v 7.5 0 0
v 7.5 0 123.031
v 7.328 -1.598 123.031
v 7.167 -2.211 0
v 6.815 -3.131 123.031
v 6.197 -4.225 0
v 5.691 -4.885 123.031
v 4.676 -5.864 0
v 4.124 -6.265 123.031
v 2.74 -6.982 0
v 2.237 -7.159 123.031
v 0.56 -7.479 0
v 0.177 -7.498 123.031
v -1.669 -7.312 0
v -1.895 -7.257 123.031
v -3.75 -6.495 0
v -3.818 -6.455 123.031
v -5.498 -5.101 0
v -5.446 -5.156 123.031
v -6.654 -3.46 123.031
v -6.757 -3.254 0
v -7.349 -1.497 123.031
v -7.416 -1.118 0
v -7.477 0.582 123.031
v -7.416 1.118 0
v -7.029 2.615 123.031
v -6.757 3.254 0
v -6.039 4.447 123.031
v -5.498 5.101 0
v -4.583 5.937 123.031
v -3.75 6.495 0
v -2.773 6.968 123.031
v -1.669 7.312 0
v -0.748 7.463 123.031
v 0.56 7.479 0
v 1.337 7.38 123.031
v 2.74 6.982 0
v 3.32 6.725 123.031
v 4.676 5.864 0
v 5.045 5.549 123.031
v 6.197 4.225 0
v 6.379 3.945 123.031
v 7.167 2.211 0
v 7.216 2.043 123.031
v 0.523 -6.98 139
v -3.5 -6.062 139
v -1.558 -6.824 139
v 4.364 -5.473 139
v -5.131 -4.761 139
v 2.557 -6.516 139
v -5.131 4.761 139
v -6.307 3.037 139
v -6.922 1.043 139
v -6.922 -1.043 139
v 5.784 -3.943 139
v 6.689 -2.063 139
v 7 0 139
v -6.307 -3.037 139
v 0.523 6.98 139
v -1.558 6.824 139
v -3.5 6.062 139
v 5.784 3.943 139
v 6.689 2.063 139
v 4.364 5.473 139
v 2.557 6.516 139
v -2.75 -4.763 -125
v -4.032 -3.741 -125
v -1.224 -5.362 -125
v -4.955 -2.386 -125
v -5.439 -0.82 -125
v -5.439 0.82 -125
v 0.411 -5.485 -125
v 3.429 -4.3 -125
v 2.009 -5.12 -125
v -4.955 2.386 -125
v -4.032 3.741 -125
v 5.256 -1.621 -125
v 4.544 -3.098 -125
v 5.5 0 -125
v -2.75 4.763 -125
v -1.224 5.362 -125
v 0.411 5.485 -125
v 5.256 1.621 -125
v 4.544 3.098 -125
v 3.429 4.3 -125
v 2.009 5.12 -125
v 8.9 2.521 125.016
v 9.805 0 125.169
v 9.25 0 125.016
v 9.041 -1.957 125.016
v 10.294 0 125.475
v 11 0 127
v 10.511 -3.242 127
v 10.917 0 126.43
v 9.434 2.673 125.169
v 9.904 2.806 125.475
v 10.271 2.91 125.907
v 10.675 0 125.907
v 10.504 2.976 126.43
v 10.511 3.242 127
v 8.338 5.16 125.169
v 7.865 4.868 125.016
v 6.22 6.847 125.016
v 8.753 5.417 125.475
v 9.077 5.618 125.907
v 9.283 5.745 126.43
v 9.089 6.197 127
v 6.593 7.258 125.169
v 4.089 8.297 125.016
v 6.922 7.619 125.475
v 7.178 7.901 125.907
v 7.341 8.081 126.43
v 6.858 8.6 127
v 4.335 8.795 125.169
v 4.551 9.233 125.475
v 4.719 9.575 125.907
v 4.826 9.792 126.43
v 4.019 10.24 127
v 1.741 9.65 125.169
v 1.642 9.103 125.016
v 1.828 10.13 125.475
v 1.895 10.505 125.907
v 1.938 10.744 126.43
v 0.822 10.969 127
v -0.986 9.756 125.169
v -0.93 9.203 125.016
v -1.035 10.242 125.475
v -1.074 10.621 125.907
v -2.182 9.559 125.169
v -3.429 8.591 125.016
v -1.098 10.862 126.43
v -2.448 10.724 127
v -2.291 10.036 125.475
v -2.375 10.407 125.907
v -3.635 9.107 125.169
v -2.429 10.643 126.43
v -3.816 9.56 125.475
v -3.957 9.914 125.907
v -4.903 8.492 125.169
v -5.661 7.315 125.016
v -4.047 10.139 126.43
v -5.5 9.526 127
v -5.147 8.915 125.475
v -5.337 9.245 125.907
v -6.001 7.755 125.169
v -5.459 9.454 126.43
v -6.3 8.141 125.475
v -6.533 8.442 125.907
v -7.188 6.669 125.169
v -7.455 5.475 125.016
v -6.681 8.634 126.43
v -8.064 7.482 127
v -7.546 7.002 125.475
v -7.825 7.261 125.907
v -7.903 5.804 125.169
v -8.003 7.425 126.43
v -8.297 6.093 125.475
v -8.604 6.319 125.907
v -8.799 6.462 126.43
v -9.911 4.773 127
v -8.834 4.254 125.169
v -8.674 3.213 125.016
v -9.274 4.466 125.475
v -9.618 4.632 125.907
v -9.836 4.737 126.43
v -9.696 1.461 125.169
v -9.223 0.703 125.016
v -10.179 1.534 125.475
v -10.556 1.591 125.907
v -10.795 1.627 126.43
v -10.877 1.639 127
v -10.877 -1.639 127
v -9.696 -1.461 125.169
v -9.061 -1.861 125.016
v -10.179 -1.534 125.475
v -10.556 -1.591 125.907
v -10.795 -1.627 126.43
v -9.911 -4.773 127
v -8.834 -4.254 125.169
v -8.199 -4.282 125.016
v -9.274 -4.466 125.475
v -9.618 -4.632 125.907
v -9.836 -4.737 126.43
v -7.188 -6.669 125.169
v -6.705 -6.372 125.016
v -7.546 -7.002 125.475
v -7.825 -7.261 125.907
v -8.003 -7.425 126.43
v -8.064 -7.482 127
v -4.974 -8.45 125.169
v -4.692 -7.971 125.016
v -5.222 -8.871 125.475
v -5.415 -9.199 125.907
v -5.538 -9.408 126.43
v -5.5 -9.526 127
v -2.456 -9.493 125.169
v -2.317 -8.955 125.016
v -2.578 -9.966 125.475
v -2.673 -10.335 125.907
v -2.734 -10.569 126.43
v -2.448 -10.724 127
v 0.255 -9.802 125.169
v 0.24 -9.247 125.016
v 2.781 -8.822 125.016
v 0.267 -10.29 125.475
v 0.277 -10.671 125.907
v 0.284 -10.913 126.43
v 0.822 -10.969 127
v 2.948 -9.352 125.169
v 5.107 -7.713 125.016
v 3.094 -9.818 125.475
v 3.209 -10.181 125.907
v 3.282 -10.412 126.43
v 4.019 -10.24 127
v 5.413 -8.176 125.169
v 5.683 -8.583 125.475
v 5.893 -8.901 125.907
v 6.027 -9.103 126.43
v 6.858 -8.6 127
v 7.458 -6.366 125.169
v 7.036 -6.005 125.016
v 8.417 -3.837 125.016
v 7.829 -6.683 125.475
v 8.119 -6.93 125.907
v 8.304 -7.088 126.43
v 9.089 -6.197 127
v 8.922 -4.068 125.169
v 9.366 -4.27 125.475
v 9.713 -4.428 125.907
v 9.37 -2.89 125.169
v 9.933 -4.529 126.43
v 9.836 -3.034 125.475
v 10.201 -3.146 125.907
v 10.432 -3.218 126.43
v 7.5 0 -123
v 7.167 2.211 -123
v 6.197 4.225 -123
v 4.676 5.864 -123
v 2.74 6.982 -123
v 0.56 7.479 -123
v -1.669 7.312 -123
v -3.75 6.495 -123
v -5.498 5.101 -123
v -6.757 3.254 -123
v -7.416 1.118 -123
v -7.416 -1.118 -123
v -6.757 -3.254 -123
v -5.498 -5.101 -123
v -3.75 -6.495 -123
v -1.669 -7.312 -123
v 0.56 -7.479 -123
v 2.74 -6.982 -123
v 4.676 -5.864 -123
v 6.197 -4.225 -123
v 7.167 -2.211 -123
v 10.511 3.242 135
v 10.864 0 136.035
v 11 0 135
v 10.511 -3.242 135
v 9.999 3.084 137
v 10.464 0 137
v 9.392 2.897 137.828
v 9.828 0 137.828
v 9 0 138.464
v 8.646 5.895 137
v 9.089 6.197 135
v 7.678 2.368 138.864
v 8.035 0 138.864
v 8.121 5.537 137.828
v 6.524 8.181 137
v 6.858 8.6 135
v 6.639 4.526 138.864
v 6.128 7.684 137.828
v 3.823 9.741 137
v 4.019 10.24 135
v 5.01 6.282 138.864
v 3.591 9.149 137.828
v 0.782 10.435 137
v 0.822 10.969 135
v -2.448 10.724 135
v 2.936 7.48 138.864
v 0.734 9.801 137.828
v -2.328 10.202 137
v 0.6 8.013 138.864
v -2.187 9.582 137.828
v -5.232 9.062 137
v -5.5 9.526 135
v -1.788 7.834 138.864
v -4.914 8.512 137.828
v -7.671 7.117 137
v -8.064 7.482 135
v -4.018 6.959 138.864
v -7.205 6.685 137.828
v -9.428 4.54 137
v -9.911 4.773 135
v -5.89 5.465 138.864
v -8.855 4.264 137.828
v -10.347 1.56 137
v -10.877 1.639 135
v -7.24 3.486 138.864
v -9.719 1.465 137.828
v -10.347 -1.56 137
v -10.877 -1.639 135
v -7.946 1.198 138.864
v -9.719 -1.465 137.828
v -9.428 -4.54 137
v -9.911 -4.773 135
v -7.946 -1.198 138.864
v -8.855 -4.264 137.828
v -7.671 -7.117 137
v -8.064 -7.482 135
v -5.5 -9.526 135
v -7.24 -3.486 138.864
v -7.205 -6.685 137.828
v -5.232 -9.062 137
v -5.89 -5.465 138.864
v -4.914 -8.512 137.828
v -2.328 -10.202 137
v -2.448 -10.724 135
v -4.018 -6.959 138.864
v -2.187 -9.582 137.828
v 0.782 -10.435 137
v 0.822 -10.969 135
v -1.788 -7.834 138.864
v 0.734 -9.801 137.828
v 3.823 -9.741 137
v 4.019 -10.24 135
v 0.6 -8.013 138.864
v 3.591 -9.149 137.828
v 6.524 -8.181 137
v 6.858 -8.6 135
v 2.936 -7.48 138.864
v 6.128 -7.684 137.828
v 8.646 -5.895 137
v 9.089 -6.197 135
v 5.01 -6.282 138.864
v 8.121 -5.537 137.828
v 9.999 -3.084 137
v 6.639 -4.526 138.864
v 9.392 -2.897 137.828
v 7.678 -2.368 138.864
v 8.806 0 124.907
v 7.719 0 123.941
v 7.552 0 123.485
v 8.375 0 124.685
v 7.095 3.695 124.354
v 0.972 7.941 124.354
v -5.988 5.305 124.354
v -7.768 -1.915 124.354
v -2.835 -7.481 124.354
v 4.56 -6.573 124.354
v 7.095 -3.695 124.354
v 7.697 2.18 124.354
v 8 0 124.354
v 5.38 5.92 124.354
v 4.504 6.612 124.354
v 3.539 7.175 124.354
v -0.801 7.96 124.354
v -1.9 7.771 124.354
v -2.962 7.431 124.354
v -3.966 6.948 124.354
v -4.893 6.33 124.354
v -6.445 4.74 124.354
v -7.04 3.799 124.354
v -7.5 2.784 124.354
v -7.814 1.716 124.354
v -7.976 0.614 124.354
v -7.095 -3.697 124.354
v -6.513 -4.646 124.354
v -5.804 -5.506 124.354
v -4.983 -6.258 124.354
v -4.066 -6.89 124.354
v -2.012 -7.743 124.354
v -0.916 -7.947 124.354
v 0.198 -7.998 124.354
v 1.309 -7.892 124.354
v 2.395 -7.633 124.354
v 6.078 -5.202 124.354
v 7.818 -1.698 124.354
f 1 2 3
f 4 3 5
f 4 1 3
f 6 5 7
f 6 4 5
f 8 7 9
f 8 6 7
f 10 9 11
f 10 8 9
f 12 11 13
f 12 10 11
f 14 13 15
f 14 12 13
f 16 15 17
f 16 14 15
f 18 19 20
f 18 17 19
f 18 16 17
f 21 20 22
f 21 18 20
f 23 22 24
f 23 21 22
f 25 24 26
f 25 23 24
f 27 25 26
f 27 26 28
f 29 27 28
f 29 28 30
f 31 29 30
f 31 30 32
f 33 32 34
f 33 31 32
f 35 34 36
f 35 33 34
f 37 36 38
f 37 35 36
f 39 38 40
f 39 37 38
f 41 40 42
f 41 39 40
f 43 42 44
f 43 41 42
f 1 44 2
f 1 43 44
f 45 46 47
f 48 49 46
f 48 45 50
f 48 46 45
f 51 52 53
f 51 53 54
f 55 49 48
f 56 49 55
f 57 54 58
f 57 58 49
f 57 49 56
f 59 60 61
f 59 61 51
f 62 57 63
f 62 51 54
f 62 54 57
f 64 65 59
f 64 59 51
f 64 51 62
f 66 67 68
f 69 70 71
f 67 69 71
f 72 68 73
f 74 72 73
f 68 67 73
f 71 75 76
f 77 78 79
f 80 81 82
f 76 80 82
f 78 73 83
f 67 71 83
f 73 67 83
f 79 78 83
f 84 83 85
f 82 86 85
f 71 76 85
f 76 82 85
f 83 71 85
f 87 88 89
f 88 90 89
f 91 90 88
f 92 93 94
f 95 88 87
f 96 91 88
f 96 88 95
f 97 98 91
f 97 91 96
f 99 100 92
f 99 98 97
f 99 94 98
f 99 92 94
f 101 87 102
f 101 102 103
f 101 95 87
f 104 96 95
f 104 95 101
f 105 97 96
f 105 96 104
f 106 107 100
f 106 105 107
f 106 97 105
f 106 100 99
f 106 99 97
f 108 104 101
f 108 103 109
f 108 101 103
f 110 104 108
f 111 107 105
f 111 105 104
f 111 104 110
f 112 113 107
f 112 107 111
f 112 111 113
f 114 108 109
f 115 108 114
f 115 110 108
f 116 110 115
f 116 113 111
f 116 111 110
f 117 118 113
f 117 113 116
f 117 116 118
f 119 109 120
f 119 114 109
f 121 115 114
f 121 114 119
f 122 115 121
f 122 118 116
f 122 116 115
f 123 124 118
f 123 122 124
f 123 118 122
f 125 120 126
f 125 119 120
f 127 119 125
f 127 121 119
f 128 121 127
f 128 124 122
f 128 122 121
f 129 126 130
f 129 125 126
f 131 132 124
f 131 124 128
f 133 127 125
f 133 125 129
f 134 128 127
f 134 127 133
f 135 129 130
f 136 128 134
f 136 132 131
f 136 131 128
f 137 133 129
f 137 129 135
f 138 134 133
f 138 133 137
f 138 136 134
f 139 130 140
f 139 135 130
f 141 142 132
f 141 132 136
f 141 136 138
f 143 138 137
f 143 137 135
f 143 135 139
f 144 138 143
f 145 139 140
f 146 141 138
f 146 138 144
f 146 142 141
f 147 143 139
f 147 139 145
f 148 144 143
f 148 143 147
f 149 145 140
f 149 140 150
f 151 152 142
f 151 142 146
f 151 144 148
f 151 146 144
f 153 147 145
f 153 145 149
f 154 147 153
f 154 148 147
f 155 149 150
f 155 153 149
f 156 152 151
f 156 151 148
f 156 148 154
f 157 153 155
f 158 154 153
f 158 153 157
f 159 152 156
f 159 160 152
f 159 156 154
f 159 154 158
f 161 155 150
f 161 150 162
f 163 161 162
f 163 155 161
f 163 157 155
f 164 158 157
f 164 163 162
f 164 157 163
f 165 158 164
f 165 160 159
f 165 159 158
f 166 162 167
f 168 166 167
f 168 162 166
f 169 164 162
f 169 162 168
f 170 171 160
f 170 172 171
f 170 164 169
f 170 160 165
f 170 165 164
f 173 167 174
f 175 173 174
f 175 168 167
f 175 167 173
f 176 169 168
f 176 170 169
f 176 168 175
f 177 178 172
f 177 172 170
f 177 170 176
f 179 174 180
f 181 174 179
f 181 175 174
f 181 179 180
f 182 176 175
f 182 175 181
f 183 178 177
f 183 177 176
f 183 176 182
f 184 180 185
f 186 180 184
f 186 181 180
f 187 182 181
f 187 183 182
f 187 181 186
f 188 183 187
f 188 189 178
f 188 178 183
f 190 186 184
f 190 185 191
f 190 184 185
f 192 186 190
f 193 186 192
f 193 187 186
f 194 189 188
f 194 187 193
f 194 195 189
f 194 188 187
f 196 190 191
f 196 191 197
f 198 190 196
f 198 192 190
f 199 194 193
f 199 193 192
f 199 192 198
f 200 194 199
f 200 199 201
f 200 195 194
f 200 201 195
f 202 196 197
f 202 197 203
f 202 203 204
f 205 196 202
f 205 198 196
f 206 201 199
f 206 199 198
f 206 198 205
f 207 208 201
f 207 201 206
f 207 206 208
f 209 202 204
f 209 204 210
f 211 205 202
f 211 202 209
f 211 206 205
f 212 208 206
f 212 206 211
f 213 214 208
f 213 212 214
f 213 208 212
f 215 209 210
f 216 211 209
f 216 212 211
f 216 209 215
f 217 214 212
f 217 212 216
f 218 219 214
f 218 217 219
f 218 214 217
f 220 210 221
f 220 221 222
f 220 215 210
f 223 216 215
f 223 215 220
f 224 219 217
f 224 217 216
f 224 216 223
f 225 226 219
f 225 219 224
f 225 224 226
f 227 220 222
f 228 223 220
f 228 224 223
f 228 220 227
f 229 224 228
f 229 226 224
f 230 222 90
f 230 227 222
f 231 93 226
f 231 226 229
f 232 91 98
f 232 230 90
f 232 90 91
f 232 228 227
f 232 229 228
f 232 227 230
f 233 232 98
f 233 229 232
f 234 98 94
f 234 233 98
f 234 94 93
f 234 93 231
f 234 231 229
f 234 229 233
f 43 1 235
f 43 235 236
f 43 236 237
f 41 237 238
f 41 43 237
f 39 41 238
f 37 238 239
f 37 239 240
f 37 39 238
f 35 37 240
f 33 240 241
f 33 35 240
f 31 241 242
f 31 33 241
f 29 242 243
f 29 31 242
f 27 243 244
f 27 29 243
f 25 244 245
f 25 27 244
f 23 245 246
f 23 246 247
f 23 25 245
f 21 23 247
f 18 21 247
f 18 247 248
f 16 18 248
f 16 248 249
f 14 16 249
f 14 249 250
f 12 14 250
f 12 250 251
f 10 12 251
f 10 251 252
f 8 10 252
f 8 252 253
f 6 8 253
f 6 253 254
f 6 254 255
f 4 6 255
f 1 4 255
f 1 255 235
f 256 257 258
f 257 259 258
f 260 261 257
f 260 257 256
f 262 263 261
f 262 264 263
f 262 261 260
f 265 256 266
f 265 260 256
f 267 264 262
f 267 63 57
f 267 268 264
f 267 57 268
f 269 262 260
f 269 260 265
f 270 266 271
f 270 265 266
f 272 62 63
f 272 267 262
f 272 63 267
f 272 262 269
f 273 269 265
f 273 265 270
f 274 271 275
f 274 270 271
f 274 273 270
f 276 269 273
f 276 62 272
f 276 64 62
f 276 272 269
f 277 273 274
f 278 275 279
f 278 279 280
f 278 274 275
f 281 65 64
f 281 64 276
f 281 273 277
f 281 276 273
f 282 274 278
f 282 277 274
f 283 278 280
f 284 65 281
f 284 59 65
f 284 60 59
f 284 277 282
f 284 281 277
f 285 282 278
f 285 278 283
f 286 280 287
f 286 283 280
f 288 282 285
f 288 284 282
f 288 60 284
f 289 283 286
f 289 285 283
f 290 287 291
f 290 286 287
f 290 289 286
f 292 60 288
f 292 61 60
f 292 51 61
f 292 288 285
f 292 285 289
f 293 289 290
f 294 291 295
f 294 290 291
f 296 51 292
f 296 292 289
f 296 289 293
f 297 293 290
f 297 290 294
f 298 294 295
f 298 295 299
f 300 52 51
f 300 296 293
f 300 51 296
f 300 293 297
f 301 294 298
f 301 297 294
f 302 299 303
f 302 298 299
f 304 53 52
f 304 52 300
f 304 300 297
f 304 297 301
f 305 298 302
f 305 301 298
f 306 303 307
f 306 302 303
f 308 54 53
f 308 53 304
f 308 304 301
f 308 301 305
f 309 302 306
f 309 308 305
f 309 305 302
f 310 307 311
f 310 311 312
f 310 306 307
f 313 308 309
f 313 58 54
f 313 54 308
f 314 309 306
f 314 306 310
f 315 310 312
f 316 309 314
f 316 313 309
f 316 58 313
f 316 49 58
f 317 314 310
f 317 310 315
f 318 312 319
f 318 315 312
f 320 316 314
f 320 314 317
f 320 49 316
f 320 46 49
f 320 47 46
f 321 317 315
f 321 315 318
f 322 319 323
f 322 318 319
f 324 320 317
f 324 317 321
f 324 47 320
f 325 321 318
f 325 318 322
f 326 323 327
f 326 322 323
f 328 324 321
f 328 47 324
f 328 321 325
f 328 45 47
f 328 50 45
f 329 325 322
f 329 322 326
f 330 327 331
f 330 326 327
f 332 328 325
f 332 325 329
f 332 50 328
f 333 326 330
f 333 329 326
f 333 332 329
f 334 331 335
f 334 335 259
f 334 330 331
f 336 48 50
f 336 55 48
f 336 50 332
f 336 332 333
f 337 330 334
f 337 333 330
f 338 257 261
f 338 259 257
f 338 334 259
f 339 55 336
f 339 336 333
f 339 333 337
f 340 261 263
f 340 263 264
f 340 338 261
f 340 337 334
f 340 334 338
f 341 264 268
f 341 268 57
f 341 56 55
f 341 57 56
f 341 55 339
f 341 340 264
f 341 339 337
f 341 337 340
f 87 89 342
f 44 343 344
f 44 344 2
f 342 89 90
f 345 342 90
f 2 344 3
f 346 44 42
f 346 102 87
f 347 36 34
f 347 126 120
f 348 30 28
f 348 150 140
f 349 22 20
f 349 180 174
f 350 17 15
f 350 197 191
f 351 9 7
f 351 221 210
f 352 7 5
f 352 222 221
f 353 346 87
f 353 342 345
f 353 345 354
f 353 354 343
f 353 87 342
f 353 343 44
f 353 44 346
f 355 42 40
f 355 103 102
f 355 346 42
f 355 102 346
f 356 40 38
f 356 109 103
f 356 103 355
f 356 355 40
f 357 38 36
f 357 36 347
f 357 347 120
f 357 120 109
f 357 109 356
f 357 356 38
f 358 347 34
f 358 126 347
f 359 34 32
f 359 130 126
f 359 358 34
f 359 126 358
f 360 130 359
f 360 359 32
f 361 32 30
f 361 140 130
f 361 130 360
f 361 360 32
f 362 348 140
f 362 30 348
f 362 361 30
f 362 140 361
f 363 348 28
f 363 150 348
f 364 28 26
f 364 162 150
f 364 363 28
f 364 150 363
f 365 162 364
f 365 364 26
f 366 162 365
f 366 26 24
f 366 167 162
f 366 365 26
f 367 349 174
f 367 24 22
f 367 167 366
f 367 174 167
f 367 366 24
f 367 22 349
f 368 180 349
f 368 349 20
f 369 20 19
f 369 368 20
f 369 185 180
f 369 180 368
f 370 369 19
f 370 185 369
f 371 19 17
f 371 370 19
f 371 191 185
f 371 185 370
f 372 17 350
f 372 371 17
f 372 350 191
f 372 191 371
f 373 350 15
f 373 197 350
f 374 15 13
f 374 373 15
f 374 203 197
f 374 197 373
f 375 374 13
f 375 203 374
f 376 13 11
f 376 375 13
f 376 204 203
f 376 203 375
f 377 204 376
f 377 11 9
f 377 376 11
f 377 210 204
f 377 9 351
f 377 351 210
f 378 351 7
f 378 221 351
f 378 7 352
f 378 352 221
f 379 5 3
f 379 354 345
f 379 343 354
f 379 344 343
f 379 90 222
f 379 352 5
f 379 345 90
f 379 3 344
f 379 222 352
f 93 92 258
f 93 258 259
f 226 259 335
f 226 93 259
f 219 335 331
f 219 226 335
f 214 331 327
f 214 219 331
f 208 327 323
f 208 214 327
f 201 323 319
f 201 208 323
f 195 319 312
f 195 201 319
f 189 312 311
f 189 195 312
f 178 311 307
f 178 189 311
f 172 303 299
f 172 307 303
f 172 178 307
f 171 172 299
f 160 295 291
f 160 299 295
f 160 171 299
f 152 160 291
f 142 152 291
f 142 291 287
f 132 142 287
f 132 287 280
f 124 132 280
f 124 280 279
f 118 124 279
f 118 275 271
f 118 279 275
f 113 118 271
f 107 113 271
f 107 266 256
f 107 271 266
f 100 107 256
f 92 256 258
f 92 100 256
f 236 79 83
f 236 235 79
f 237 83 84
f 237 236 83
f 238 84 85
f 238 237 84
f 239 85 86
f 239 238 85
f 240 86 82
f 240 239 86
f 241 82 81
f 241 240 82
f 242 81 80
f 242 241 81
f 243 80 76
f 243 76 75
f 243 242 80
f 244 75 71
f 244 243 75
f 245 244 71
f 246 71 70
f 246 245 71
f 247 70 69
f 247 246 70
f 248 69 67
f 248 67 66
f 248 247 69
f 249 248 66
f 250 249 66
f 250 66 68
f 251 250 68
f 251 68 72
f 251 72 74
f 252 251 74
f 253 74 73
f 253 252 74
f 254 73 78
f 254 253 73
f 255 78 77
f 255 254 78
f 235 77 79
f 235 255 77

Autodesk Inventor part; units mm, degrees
ref_plane "YZ Plane" through (0, 0, 0) normal (1, 0, 0) x (0, 1, 0)
ref_plane "XZ Plane" through (0, 0, 0) normal (0, 1, 0) x (-1, 0, 0)
ref_plane "XY Plane" through (0, 0, 0) normal (0, 0, 1) x (1, 0, 0)
sketch "Sketch1" plane through (0, 0, 0) normal (0, 0, 1) x (1, 0, 0)
  circle A0 centre (0, 0) radius 7.5
  dimension "d0" = 15
extrude "Extrusion1" add sketch "Sketch1" along normal mid plane 250
sketch "Sketch2" plane through (0, 0, 125) normal (0, 0, 1) x (1, 0, 0)
  circle A0 centre (0, 0) radius 7.5 projected
  circle A1 centre (0, 0) radius 11
  dimension "d3" = 22
extrude "Extrusion2" add sketch "Sketch2" along normal blind 14 contours A0 | A1
fillet "Fillet1" radius 2 2 edges at (-11, 0, 125) (-7.5, 0, 125)
fillet "Fillet2" radius 4 1 edges at (-11, 0, 139)
chamfer "Chamfer1" distance 2 angle 45 1 edges at (-7.5, 0, -125)
thread "Thread1" size "M15x1" class "6g" standard "ISO Metric profile" length 16
properties part number "HANDLE" material "Steel, Mild"
